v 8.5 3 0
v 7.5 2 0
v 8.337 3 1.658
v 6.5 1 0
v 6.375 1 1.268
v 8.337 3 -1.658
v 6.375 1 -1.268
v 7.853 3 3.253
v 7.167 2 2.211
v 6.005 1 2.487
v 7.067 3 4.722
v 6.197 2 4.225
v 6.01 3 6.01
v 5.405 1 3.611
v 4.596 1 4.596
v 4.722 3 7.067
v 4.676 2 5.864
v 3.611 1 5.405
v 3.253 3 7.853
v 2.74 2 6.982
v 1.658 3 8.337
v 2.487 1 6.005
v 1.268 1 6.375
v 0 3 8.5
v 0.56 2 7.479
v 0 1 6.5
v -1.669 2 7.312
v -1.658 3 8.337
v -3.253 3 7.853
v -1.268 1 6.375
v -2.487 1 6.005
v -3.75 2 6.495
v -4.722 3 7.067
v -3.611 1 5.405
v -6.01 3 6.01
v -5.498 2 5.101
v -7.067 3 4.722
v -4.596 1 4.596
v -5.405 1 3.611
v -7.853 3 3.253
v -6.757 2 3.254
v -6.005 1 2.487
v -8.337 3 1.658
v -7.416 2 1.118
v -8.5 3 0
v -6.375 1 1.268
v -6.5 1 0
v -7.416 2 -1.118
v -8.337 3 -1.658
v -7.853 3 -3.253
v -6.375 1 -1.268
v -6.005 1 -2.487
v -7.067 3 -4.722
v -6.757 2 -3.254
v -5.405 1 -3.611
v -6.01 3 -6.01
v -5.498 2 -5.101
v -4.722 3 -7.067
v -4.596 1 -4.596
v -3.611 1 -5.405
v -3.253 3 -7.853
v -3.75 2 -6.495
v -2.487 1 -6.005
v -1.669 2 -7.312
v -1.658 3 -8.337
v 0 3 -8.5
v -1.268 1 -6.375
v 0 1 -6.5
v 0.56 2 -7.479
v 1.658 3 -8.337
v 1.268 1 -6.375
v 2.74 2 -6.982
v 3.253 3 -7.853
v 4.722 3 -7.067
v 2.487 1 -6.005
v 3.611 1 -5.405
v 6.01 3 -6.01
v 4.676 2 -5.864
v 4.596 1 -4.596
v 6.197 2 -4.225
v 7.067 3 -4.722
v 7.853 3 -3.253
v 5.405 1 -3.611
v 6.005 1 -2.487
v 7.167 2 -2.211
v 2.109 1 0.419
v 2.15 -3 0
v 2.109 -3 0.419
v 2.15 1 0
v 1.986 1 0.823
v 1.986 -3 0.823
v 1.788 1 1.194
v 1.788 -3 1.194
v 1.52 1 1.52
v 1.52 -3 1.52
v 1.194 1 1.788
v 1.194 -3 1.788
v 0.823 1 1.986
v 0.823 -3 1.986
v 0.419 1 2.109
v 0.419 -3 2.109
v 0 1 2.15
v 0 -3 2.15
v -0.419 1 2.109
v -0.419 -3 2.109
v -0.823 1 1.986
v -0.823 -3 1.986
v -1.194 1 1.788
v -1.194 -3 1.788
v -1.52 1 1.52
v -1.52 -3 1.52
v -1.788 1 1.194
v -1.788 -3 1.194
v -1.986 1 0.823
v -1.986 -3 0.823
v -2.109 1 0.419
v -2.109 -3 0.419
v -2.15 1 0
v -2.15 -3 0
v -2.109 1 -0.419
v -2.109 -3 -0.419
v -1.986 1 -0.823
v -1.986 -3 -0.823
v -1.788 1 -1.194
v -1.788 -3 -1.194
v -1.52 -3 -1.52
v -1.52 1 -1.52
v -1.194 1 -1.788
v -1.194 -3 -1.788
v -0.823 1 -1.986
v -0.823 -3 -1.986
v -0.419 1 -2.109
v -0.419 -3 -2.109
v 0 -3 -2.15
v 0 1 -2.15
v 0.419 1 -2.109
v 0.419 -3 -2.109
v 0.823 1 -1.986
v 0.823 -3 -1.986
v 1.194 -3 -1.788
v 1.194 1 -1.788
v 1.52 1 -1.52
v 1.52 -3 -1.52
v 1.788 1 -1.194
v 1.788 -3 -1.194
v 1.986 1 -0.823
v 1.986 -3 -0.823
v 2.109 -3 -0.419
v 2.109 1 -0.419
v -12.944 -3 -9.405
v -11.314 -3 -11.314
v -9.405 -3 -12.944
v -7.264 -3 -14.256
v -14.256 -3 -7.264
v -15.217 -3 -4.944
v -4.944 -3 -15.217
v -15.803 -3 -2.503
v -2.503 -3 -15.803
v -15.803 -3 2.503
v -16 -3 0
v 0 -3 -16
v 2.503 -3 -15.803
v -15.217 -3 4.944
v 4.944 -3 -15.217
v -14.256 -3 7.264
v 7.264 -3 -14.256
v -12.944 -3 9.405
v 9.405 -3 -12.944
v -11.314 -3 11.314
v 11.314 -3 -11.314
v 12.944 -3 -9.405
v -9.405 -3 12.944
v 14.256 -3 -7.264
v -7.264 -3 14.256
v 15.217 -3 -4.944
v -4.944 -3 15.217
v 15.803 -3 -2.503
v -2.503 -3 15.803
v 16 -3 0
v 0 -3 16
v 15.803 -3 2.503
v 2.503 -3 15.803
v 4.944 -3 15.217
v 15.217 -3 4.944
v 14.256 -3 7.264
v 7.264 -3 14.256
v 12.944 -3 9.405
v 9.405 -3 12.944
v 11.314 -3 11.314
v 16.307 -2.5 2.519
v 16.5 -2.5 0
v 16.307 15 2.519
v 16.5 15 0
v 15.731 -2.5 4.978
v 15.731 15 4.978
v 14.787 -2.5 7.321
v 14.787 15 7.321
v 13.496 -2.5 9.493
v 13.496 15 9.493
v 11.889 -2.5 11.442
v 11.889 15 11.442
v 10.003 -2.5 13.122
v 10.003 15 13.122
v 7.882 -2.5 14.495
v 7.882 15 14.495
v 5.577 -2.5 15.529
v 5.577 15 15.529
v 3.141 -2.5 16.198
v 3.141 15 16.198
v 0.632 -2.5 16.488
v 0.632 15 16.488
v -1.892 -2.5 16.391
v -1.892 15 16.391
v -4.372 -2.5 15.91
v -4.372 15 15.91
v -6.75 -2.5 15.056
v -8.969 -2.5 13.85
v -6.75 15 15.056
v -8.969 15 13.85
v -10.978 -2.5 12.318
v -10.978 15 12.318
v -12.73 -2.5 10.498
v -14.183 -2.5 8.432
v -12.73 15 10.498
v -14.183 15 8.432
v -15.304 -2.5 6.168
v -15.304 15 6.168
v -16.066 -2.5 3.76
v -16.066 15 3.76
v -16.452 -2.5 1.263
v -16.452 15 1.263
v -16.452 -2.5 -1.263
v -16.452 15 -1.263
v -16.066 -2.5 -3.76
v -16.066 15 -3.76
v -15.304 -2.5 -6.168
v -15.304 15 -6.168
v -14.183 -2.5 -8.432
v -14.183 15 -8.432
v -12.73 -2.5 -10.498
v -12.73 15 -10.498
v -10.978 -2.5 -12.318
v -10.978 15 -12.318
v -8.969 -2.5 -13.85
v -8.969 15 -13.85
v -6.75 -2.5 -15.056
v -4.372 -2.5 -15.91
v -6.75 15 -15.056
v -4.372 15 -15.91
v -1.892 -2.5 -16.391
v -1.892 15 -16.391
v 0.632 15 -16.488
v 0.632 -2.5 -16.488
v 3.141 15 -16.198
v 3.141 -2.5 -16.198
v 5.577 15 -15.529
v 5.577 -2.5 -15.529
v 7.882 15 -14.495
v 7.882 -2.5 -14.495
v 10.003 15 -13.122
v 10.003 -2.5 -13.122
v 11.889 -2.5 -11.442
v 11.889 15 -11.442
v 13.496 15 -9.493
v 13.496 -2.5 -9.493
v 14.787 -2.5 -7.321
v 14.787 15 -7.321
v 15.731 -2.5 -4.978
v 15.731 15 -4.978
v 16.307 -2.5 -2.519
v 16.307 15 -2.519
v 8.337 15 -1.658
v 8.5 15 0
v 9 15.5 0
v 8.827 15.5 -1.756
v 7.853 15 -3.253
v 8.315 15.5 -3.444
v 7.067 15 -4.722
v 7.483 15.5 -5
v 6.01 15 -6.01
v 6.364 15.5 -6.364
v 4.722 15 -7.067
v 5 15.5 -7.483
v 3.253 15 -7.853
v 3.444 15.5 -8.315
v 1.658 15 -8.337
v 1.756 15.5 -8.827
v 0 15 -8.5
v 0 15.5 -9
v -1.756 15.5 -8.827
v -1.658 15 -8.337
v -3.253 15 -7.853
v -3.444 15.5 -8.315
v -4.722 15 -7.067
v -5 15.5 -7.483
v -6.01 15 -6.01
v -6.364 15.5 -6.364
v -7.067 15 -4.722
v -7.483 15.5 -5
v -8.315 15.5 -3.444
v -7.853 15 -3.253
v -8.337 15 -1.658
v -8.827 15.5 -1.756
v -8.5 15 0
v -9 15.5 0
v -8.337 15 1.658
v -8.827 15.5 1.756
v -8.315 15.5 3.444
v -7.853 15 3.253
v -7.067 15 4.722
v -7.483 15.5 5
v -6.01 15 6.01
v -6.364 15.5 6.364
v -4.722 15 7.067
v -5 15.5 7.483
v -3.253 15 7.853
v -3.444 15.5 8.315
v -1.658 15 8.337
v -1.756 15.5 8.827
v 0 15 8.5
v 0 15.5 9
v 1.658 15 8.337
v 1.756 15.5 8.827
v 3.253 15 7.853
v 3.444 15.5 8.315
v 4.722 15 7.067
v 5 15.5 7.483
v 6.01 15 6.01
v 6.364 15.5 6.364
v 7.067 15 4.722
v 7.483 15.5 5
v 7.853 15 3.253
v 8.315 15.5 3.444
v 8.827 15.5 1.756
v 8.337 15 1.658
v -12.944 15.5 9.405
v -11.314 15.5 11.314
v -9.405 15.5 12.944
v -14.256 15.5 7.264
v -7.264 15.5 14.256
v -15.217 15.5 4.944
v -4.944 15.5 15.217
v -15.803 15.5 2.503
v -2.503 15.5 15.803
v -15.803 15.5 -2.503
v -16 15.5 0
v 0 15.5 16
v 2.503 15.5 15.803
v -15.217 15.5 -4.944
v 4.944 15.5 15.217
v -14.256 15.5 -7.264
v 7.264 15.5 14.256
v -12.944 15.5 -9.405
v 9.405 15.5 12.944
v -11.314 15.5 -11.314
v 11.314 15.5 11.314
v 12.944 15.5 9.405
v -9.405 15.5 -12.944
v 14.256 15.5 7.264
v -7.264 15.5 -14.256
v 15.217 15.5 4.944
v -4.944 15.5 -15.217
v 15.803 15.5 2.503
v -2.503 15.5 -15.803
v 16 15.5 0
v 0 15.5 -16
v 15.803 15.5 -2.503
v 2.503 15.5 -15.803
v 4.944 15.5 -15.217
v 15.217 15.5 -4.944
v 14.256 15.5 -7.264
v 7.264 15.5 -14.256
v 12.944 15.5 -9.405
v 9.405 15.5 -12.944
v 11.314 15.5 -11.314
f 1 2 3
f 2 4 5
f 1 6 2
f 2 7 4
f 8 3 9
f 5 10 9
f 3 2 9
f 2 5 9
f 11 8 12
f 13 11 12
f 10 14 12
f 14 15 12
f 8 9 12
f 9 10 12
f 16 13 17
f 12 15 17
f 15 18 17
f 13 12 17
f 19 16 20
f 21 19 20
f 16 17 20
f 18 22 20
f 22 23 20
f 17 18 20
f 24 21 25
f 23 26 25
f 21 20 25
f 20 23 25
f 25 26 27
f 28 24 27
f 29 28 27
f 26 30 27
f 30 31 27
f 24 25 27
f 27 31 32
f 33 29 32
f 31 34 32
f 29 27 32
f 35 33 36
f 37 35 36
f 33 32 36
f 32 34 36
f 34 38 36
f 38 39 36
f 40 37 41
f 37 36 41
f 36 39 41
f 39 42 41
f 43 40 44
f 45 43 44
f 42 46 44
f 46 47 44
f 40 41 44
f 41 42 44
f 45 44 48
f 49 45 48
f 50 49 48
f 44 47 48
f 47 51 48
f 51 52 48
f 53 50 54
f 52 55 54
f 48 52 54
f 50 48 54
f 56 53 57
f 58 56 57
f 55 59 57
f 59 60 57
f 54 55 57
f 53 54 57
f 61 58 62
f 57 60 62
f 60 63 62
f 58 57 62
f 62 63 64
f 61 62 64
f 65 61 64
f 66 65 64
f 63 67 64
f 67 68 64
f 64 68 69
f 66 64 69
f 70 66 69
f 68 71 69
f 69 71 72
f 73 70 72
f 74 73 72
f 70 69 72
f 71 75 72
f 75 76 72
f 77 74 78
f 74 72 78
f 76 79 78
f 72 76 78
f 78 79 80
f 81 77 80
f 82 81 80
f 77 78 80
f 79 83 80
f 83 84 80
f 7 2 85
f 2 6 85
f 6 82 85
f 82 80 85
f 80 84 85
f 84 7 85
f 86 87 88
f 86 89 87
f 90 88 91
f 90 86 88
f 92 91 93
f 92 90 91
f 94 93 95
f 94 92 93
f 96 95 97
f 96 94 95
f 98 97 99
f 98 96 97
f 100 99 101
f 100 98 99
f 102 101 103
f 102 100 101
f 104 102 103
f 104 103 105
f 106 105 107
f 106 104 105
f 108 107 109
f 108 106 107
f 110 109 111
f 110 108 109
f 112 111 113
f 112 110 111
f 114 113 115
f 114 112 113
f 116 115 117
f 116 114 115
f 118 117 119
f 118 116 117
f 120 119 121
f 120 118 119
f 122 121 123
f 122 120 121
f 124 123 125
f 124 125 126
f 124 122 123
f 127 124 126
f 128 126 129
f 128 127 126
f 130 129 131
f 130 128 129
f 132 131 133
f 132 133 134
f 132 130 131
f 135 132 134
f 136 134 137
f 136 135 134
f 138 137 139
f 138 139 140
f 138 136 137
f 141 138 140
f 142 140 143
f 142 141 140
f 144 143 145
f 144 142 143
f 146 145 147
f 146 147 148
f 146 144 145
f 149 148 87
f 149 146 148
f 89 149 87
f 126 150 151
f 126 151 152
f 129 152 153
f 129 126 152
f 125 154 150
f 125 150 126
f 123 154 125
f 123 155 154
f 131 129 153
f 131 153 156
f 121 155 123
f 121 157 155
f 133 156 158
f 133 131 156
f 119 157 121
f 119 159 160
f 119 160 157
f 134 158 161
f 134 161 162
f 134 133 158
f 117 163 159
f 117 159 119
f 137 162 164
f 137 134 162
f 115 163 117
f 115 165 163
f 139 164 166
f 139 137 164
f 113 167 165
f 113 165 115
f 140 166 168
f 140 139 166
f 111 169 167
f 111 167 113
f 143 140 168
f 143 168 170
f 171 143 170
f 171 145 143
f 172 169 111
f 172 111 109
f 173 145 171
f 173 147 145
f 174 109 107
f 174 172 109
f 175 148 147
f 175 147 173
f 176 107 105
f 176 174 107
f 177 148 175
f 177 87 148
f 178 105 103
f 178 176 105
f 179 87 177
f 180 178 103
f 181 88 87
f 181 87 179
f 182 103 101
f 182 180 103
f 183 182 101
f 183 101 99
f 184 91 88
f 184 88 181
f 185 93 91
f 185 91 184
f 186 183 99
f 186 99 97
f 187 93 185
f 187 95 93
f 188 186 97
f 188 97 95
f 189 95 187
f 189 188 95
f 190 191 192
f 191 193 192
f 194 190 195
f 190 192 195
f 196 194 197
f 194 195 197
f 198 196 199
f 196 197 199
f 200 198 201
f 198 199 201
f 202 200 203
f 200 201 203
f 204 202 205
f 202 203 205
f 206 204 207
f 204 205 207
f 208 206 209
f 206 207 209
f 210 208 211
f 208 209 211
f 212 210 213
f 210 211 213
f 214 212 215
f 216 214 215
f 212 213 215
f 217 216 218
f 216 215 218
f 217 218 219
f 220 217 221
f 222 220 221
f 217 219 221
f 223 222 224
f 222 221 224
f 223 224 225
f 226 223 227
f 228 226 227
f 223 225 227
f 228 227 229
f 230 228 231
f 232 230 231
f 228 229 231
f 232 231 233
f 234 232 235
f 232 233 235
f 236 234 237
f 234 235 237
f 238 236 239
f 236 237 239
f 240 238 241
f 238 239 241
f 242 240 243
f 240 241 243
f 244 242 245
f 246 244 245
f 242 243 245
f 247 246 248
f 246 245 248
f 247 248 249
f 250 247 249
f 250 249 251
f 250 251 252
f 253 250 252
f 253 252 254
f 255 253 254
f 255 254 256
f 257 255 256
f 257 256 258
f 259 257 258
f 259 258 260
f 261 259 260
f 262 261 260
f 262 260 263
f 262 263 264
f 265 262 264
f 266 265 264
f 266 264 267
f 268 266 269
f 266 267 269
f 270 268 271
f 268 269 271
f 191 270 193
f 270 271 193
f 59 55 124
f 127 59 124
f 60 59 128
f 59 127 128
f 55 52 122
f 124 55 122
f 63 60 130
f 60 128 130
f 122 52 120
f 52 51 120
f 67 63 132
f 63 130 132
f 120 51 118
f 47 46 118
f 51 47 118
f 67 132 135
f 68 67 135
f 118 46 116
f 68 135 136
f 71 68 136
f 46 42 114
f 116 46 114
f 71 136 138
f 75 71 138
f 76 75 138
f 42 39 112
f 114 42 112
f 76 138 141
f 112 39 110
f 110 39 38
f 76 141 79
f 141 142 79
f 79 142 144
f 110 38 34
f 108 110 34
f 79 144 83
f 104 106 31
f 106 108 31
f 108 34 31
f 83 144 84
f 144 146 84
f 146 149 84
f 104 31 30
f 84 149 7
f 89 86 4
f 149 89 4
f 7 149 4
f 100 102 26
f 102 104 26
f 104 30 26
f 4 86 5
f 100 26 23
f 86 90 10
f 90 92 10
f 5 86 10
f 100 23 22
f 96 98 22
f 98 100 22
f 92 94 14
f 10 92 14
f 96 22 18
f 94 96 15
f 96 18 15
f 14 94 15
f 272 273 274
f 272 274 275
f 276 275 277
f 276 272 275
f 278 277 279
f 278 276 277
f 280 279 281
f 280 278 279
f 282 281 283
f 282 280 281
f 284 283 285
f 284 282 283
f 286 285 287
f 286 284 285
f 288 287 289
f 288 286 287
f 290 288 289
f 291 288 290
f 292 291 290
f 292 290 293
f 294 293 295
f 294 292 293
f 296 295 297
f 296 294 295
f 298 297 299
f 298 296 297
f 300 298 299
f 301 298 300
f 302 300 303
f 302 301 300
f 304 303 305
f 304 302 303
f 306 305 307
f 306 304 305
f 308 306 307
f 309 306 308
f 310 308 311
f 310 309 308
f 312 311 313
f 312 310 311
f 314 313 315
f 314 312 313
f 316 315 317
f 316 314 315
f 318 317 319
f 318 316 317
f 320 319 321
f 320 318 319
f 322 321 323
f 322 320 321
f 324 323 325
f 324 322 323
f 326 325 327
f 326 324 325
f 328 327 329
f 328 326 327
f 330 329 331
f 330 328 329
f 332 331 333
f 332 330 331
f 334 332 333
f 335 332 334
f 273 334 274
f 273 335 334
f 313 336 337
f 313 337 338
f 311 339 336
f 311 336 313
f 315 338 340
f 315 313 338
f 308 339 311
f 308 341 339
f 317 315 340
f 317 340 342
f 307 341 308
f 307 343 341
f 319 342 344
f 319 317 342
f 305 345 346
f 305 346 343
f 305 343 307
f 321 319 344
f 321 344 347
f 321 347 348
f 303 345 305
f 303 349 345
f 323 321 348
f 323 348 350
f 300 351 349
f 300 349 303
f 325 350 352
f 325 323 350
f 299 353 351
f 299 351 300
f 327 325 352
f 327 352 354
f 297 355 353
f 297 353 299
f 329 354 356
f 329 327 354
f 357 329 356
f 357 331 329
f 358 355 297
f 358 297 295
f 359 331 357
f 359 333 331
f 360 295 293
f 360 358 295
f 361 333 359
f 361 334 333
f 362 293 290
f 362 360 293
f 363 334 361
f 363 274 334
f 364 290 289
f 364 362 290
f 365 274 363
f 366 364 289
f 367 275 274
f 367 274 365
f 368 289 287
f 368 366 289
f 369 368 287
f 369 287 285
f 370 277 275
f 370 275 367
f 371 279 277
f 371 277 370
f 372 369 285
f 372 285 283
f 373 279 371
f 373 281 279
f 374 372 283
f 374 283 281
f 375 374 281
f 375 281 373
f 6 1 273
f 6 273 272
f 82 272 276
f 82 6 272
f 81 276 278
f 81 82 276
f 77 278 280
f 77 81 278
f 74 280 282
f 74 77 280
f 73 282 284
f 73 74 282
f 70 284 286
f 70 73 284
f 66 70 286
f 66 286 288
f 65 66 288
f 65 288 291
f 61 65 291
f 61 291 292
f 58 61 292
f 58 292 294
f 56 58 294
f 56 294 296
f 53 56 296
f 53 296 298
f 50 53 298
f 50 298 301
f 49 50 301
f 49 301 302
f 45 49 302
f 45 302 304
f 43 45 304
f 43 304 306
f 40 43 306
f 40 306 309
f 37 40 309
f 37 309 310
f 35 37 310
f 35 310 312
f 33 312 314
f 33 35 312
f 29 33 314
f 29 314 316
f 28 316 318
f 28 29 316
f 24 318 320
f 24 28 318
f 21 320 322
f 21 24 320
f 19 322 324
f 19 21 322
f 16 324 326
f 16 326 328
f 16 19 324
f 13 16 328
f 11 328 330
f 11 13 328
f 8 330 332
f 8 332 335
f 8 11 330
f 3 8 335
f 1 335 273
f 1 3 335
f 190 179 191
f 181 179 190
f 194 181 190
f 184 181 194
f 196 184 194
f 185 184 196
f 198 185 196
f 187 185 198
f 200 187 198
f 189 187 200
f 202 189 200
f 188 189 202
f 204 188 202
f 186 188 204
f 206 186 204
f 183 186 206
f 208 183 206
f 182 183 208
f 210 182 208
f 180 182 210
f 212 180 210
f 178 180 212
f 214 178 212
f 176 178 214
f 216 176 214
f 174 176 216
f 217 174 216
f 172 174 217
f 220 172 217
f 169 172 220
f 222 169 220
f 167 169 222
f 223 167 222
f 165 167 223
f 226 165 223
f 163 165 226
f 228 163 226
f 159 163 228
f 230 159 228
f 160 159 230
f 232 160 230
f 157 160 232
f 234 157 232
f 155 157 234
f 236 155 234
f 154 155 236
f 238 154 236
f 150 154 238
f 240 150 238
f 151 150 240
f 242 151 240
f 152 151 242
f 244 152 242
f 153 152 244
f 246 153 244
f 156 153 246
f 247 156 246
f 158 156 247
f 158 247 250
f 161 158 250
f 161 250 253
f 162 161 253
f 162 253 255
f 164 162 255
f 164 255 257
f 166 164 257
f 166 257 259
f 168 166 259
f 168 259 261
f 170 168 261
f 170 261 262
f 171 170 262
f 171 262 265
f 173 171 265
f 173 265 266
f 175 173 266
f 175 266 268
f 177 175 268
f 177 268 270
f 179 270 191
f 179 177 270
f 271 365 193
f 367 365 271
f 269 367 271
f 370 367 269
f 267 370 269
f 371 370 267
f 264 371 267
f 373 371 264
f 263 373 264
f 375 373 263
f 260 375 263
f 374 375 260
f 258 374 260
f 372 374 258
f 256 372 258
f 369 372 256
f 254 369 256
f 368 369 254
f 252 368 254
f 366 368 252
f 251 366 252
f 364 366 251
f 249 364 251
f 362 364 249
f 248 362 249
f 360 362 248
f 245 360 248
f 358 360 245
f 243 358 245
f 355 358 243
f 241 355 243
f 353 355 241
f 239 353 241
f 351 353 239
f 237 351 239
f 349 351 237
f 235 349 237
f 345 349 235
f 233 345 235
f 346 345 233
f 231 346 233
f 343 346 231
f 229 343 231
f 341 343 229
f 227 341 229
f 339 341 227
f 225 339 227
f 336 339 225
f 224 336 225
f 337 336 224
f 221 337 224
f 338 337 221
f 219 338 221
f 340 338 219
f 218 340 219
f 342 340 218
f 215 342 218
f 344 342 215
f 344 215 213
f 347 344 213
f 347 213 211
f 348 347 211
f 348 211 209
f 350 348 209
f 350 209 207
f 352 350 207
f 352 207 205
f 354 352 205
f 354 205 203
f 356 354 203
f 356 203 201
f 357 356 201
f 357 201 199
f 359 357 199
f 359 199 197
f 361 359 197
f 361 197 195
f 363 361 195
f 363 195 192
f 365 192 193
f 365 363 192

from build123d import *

# Parameters (mm, degrees)
SKETCH1_R                = 16.5
SKETCH1_R_2              = 8.5
BOSS_EXTRUDE1_DEPTH      = 15.5
SKETCH2_R                = 16.5
SKETCH2_R_2              = 2.15
BOSS_EXTRUDE2_DEPTH      = 3
BOSS_EXTRUDE2_DEPTH_BACK = 1
CHAMFER2_SIZE            = 0.5
CHAMFER3_SIZE            = 2


with BuildPart() as part:
    # Sketch1 → Boss-Extrude1 (new body)
    with BuildSketch(Plane(origin=(0, 0, 0), x_dir=(1, 0, 0), z_dir=(0, 1, 0))):
        Circle(SKETCH1_R)
        Circle(SKETCH1_R_2, mode=Mode.SUBTRACT)
    extrude(amount=BOSS_EXTRUDE1_DEPTH)

    # Sketch2 → Boss-Extrude2 (add, two sides)
    with BuildSketch(Plane.XZ) as boss_extrude2_sk:
        Circle(SKETCH2_R)
        Circle(SKETCH2_R_2, mode=Mode.SUBTRACT)
    extrude(amount=BOSS_EXTRUDE2_DEPTH)
    extrude(boss_extrude2_sk.sketch, amount=-BOSS_EXTRUDE2_DEPTH_BACK)

    # Chamfer2
    chamfer2_edges = [part.edges().sort_by_distance(p)[0] for p in [
        (-16.5, -3, 0),
        (-16.5, 15.5, 0),
        (-8.5, 15.5, 0),
    ]]
    chamfer(chamfer2_edges, length=CHAMFER2_SIZE)

    # Chamfer3
    chamfer3_edges = [part.edges().sort_by_distance(p)[0] for p in [
        (-8.5, 1, 0),
    ]]
    chamfer(chamfer3_edges, length=CHAMFER3_SIZE)


solid = part.part
